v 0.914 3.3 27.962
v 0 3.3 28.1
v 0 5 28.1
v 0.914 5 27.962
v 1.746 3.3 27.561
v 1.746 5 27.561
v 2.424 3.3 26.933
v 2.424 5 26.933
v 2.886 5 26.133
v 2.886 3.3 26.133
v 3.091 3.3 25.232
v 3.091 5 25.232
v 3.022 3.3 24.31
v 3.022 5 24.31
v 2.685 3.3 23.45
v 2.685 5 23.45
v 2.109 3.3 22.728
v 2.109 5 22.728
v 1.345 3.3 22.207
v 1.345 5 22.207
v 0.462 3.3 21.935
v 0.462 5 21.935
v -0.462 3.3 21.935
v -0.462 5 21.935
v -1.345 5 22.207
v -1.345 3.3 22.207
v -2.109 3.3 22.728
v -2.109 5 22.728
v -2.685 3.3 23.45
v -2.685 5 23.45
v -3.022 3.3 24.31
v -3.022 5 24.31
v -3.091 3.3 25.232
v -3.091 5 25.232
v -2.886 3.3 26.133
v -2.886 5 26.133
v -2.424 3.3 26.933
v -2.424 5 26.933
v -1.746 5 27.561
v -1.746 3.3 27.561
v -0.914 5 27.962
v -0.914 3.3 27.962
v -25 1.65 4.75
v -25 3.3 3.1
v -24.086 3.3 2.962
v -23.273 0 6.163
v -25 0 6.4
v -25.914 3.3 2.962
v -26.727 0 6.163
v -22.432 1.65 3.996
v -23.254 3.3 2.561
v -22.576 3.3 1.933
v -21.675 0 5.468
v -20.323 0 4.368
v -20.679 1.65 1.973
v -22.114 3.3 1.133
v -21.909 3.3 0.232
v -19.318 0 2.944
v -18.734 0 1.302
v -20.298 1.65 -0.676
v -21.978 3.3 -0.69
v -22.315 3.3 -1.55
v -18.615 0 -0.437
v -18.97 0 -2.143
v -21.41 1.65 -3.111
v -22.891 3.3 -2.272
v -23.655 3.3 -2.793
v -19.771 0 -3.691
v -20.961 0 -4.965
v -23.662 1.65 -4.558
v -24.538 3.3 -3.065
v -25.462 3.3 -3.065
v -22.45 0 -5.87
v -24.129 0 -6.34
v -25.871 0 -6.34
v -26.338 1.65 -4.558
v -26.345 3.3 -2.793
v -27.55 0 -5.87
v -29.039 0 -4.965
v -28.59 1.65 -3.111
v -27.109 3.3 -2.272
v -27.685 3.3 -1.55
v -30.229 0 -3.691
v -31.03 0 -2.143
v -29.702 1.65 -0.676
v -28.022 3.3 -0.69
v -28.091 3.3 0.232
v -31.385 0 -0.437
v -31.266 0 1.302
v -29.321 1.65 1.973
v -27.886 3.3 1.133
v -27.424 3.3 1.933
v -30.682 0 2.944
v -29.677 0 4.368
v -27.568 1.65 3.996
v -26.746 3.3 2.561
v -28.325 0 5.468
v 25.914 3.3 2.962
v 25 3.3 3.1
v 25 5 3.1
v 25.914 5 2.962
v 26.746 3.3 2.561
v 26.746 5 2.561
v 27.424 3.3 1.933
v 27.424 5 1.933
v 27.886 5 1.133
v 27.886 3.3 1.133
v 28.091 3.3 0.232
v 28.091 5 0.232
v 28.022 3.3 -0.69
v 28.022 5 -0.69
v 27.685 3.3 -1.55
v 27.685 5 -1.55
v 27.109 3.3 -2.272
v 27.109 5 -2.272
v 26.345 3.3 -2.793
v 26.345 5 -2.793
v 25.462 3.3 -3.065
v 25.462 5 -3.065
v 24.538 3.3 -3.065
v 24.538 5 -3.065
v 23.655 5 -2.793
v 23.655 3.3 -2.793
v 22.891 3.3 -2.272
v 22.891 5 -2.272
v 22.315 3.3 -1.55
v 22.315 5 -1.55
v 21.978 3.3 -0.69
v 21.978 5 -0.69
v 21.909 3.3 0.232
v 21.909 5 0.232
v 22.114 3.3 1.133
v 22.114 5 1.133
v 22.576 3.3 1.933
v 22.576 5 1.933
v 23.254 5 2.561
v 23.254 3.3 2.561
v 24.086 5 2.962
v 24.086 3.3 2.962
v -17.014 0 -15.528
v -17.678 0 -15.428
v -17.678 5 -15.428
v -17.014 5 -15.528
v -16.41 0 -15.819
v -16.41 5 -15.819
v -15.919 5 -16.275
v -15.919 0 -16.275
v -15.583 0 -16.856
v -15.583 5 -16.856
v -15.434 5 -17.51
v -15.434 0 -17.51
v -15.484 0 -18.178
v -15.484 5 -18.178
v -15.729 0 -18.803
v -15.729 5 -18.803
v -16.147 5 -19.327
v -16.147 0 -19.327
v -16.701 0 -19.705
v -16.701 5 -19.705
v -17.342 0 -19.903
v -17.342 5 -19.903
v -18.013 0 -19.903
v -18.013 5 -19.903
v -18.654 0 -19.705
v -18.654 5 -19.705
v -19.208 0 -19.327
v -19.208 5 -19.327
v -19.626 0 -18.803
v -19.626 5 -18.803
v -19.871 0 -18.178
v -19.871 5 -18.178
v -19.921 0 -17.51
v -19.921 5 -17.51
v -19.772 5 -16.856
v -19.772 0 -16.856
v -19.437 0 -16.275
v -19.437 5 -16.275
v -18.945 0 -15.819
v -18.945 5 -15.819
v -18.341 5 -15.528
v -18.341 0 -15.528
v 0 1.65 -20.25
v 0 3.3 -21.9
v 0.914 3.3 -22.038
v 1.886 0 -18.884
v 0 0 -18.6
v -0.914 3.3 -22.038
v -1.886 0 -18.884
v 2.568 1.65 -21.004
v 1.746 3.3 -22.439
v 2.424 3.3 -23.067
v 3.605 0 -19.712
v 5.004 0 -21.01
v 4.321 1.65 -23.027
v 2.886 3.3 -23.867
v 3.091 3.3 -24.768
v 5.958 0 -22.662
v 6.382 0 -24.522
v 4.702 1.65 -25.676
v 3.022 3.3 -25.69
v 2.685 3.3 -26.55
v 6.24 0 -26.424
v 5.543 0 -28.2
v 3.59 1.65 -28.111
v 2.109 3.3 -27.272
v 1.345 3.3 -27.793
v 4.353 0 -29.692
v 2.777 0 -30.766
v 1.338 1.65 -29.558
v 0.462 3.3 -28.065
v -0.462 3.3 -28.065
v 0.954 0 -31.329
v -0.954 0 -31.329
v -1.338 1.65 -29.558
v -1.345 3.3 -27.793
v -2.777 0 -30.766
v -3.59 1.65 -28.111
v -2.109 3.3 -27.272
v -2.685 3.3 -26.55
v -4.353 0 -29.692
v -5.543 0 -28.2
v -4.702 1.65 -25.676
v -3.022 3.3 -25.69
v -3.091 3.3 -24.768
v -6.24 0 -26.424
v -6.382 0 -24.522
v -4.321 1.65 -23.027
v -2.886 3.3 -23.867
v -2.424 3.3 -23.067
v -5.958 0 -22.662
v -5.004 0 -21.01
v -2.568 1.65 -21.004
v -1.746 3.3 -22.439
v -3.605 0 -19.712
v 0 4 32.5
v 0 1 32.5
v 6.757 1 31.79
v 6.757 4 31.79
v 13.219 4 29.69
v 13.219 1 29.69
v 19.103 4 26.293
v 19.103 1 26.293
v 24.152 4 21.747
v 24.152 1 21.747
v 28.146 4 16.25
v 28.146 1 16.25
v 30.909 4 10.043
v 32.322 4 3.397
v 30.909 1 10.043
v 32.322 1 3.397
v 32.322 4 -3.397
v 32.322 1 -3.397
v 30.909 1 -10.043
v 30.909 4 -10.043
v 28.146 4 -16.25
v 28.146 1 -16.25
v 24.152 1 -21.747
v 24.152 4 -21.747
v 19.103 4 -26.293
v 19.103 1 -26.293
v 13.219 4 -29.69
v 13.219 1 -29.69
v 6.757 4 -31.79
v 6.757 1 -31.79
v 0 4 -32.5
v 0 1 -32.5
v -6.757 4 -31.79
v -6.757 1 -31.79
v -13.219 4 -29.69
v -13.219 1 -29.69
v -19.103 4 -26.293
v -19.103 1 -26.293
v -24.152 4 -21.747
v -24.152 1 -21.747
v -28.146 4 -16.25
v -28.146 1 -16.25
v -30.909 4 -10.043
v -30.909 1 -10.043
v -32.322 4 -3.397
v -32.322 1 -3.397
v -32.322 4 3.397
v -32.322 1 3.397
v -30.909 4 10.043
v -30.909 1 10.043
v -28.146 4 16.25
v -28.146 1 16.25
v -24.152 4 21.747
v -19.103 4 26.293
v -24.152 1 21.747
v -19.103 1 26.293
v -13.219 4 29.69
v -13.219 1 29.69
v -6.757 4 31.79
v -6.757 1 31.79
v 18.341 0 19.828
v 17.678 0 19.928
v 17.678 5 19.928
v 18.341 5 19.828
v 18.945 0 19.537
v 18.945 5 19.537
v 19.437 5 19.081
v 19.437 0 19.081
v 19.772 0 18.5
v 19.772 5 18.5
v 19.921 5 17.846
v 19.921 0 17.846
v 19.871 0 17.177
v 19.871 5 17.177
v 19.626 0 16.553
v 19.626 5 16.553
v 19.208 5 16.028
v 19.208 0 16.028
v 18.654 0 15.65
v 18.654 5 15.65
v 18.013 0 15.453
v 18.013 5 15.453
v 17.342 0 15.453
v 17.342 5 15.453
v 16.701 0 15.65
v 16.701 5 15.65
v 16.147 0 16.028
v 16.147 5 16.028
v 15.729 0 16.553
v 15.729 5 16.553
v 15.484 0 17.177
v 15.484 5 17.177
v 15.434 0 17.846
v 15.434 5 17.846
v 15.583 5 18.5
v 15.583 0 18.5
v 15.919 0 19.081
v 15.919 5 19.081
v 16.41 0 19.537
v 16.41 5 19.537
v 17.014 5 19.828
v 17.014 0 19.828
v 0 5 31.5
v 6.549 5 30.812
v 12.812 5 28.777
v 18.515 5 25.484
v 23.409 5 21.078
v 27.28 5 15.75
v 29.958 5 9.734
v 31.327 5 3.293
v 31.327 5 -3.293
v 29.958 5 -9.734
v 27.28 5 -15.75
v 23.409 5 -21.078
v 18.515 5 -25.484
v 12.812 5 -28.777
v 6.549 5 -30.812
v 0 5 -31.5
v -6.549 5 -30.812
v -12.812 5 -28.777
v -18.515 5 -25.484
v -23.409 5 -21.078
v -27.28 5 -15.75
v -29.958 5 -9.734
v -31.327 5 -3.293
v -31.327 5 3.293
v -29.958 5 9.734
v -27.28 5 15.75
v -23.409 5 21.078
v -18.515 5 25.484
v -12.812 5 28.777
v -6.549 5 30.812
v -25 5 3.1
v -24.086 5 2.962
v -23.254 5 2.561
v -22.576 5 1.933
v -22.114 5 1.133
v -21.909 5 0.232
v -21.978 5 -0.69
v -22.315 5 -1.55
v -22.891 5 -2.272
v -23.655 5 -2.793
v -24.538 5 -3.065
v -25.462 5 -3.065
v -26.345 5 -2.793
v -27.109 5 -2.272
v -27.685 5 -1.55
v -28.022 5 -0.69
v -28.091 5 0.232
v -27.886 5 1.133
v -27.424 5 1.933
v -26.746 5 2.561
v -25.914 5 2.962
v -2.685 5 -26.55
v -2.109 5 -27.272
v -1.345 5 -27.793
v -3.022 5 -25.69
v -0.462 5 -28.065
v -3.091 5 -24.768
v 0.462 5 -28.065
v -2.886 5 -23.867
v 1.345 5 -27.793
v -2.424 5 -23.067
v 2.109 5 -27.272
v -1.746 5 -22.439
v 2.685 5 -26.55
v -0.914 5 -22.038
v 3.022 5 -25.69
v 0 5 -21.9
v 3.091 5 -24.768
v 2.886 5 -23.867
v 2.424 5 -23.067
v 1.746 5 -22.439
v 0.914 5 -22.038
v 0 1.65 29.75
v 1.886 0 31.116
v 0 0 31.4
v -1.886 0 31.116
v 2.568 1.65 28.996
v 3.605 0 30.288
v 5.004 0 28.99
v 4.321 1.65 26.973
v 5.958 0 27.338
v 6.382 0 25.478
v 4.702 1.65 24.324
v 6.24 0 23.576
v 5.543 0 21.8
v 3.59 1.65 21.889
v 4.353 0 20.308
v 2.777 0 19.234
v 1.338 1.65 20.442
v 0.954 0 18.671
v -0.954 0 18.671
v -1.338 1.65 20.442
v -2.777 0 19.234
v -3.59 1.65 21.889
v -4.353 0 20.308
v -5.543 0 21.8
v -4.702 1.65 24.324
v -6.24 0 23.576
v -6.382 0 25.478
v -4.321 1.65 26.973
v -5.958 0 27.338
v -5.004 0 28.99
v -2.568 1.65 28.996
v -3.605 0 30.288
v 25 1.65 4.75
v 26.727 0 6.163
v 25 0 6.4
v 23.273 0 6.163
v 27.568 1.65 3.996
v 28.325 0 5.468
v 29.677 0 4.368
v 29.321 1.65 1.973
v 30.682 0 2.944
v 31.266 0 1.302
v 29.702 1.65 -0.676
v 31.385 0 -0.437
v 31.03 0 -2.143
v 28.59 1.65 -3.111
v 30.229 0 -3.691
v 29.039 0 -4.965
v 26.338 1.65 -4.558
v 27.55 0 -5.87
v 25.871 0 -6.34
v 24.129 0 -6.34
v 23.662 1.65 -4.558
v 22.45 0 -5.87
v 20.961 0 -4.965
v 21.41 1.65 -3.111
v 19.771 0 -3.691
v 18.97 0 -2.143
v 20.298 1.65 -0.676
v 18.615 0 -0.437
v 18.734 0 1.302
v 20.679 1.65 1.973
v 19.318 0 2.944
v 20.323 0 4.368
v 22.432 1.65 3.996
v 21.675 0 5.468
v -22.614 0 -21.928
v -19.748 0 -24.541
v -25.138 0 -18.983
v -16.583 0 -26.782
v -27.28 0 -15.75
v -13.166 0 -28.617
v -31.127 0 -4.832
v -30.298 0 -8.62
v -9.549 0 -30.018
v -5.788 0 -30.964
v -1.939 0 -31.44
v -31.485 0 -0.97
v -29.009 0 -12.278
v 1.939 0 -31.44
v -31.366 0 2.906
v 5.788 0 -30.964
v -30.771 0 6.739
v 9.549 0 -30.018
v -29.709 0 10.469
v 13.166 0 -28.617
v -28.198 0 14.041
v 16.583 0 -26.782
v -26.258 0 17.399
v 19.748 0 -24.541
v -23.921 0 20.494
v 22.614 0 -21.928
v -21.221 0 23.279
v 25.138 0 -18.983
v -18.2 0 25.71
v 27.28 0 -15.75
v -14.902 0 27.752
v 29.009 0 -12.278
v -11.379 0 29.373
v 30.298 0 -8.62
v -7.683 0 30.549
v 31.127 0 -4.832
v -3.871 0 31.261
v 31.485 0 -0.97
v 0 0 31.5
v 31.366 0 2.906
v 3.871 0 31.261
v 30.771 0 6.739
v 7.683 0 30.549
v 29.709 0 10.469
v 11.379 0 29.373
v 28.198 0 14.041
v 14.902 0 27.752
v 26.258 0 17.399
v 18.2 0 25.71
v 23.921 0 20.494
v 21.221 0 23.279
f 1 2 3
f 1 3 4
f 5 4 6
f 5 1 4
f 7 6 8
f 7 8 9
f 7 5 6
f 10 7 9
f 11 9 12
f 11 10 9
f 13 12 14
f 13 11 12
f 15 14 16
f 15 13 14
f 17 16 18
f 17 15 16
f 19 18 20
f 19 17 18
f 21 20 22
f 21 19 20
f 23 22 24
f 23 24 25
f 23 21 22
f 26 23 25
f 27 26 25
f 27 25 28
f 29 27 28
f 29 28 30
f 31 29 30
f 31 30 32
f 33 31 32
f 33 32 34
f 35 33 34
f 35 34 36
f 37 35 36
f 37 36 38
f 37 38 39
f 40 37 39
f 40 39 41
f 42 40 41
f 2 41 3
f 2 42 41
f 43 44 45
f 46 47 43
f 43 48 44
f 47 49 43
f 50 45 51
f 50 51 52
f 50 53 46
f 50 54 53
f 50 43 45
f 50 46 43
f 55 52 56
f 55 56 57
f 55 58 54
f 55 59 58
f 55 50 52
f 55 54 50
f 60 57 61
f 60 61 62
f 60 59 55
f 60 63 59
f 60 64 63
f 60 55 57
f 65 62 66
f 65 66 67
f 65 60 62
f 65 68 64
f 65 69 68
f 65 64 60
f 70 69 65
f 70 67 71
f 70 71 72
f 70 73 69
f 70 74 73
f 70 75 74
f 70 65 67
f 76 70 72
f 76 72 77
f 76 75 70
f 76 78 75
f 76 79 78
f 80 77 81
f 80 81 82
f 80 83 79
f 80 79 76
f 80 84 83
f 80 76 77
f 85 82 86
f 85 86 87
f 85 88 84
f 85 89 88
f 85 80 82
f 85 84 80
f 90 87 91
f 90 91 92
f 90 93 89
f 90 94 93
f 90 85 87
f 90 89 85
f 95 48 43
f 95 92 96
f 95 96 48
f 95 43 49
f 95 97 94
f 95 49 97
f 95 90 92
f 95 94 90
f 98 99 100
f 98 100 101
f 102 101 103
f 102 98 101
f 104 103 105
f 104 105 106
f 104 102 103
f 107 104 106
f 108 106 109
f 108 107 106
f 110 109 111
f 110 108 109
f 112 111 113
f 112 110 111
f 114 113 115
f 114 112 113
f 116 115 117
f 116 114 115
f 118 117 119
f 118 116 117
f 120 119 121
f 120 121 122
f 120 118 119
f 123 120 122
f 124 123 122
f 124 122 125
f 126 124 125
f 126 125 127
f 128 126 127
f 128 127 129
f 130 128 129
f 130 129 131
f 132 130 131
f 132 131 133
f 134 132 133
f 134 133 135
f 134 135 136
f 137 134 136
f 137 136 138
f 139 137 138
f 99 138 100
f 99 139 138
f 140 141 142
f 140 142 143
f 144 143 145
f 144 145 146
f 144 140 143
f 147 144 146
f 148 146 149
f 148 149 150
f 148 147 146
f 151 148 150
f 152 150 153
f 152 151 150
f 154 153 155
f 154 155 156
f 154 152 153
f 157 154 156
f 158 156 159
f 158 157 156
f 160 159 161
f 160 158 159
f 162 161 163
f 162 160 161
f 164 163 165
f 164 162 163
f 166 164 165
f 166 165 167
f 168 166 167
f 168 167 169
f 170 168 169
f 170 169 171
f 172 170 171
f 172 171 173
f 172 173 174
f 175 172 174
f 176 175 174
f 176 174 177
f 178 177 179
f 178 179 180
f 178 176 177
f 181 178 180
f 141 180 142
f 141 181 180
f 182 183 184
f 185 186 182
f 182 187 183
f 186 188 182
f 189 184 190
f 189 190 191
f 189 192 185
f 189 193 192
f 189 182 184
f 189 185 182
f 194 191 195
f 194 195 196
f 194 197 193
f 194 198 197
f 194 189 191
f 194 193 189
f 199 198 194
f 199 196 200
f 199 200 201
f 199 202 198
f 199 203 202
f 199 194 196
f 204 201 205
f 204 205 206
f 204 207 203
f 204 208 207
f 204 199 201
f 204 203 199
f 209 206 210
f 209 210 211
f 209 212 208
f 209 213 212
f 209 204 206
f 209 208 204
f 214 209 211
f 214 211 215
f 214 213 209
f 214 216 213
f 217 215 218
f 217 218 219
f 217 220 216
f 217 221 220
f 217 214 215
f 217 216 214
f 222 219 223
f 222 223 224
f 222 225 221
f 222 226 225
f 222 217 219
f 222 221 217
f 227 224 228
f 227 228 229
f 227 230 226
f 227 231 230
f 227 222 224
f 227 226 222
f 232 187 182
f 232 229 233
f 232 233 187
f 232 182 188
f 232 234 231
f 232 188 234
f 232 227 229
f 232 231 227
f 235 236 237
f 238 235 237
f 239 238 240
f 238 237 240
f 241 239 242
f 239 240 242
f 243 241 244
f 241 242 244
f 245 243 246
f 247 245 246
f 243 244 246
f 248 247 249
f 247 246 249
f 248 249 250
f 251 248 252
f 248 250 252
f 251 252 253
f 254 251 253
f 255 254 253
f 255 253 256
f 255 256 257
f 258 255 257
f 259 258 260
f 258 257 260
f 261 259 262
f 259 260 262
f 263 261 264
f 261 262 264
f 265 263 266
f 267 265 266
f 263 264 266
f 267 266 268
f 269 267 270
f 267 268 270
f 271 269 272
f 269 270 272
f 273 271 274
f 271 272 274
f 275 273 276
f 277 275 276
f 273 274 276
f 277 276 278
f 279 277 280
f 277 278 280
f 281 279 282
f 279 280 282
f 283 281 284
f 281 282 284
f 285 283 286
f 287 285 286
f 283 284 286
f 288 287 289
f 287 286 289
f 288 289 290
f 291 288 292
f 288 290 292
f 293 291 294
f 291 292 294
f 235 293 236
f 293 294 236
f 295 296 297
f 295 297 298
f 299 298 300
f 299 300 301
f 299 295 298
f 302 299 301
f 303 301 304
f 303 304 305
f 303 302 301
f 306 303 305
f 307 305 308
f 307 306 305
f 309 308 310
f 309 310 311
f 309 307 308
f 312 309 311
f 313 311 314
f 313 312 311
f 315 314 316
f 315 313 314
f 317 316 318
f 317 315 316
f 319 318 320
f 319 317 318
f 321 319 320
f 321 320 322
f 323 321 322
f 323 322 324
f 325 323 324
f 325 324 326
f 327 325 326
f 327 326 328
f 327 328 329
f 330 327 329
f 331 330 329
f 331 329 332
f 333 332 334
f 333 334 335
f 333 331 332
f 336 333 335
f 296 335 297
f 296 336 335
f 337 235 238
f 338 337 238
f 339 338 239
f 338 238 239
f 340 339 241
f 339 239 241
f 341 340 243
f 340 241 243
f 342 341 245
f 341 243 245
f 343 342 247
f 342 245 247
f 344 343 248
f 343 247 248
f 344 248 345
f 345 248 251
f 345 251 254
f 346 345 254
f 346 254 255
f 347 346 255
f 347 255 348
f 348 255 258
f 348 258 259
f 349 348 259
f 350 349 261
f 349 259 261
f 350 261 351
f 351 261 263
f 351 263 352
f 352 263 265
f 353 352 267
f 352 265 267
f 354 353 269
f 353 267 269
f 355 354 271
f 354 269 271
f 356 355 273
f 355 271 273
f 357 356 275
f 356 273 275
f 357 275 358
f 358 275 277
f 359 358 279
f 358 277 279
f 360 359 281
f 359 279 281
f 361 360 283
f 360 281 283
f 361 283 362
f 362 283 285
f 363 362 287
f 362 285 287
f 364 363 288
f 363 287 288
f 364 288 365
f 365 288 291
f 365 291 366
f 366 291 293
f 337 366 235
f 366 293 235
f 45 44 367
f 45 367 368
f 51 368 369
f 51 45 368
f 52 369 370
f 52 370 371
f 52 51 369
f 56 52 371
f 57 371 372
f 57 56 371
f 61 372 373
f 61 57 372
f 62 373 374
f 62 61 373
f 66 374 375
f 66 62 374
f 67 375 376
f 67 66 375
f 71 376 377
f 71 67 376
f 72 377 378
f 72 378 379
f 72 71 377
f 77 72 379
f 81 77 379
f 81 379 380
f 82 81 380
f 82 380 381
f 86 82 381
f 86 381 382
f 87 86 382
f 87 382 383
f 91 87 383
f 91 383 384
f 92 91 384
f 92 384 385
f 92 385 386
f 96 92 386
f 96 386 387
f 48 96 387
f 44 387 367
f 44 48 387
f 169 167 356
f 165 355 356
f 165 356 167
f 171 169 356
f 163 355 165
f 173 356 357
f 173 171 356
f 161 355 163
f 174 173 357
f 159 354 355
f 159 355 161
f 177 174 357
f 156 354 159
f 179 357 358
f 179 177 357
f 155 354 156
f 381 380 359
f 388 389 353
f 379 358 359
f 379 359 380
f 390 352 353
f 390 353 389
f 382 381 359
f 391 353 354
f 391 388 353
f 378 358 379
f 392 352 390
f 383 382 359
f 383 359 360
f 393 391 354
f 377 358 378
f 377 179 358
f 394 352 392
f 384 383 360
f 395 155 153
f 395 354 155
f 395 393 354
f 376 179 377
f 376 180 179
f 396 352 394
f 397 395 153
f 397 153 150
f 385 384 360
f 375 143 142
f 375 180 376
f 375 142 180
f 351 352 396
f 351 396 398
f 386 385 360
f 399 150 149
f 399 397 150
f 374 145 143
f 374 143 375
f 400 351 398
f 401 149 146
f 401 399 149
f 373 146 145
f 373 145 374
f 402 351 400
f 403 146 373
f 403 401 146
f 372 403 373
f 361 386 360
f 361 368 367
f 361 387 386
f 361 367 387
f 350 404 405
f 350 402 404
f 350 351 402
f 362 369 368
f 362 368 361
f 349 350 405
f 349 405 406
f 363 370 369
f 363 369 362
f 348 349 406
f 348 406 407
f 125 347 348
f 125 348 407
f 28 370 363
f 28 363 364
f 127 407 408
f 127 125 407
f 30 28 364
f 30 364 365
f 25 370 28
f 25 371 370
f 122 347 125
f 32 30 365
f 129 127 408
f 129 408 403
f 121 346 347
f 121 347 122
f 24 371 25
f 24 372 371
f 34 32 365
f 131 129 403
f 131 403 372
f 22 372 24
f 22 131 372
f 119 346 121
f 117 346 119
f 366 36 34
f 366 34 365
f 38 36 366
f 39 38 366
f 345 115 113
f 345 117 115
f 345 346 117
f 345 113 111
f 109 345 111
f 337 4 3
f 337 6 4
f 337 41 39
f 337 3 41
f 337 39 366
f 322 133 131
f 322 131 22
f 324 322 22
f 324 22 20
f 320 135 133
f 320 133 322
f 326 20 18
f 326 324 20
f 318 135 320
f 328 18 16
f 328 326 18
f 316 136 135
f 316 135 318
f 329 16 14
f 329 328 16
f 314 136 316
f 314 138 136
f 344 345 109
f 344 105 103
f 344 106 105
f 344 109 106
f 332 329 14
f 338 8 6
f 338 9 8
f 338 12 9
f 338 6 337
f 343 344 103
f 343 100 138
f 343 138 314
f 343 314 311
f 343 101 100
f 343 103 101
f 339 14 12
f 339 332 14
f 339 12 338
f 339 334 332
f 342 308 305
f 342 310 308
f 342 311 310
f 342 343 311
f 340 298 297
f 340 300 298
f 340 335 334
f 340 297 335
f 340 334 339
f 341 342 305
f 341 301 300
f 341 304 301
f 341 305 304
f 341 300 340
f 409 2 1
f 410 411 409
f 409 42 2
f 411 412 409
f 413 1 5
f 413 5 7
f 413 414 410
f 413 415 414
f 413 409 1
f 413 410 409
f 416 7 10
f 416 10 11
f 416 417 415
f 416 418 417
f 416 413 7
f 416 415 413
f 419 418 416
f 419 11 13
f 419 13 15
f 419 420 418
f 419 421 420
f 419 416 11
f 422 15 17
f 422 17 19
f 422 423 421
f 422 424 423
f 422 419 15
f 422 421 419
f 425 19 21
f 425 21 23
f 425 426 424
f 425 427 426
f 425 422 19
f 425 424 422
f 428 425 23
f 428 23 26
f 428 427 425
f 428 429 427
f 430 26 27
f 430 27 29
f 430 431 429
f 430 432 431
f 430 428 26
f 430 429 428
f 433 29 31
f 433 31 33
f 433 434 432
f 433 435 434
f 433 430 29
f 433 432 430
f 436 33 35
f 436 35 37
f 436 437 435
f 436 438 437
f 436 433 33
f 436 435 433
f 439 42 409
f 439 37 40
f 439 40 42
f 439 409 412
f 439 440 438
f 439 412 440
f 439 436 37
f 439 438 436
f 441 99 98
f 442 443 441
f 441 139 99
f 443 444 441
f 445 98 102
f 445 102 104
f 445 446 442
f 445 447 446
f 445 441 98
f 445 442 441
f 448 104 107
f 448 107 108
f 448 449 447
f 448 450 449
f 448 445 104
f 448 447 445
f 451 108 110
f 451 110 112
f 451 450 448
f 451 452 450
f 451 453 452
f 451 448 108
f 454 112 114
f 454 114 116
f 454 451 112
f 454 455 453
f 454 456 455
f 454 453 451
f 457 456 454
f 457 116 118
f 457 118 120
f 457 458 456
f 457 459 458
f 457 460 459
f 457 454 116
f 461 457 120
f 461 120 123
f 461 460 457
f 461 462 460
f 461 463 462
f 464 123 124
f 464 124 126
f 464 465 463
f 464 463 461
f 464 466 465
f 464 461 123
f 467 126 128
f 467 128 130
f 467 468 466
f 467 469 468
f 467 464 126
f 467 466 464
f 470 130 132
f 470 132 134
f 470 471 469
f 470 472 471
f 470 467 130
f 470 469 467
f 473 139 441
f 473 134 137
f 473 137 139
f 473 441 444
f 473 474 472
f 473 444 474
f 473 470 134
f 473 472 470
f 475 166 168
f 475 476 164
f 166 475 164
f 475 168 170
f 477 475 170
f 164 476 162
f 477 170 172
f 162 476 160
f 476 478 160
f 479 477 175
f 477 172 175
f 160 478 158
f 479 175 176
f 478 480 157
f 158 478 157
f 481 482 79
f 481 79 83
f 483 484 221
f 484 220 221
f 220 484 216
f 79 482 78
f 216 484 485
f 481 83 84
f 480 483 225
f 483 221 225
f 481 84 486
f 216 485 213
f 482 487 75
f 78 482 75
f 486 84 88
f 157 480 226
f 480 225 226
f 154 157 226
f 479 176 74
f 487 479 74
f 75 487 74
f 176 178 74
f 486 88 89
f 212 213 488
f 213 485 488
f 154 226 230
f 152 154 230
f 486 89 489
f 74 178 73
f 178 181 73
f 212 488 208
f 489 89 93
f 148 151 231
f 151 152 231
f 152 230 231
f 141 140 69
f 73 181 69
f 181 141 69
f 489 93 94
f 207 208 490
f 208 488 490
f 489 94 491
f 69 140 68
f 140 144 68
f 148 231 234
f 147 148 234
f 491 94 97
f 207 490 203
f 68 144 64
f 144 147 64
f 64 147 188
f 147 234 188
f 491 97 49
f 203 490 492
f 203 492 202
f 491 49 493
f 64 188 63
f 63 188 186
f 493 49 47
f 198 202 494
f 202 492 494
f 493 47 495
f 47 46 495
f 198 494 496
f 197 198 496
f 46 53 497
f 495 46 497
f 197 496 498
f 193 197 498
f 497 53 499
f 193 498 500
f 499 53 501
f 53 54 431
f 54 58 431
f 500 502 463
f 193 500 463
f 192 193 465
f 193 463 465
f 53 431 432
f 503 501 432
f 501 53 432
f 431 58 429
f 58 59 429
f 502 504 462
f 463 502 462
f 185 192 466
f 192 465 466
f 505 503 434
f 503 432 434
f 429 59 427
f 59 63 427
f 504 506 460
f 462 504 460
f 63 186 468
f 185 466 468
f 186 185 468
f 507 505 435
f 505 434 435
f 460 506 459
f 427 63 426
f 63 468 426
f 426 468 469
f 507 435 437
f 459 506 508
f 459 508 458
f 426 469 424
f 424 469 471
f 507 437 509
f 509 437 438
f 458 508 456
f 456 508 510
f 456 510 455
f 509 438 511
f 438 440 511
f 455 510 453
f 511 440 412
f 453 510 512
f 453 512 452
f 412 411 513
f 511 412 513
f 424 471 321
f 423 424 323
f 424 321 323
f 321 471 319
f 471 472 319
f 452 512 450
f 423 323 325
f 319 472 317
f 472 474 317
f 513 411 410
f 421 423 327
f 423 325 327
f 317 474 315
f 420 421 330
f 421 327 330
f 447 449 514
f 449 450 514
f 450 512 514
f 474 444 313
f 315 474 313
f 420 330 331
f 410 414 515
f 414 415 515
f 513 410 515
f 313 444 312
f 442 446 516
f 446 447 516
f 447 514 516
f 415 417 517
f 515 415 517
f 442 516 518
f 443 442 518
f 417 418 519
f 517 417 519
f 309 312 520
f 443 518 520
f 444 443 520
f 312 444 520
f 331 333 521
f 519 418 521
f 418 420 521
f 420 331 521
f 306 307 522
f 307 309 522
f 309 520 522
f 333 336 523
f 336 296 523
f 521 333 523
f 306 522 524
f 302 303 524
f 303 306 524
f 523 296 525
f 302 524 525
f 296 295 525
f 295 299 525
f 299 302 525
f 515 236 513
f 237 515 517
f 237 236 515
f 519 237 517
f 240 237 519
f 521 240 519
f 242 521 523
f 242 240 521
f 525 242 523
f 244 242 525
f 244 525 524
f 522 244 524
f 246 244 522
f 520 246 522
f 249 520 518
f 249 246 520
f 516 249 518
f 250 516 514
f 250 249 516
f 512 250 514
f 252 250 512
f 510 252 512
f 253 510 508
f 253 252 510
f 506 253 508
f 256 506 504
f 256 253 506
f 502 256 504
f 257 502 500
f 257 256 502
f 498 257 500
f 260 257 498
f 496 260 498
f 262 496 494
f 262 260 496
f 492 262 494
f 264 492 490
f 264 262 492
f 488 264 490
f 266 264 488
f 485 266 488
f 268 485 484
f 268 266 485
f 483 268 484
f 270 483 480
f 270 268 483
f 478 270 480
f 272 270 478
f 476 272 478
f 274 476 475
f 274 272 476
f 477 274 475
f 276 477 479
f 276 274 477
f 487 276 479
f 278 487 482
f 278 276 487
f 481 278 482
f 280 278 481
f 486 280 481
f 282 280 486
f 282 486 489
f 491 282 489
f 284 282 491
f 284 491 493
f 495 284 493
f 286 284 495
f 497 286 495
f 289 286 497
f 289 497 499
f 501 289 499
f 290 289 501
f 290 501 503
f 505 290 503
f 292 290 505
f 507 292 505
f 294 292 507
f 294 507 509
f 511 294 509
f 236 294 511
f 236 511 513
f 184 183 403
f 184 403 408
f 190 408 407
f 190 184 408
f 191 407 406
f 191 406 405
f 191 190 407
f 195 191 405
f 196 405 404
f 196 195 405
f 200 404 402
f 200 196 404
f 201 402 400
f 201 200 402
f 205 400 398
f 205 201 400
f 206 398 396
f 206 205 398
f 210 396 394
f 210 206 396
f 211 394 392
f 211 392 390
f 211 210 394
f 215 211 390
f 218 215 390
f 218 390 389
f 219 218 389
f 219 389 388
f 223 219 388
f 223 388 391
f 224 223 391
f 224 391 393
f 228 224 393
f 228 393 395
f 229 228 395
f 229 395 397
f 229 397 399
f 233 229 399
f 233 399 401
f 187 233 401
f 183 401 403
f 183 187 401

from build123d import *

# Parameters (mm, degrees)
SKETCH1_R           = 32.5
SKETCH1_R_2         = 3.1
SKETCH1_R_3         = 2.25
BOSS_EXTRUDE1_DEPTH = 5
CHAMFER1_SIZE       = 3.3
CHAMFER2_SIZE       = 1


with BuildPart() as part:
    # Sketch1 → Boss-Extrude1 (new body)
    with BuildSketch(Plane(origin=(0, 0, 0), x_dir=(1, 0, 0), z_dir=(0, 1, 0))):
        Circle(SKETCH1_R)
        with Locations((0, 25)):
            Circle(SKETCH1_R_2, mode=Mode.SUBTRACT)
        with Locations((25, 0)):
            Circle(SKETCH1_R_2, mode=Mode.SUBTRACT)
        with Locations((0, -25)):
            Circle(SKETCH1_R_2, mode=Mode.SUBTRACT)
        with Locations((-25, 0)):
            Circle(SKETCH1_R_2, mode=Mode.SUBTRACT)
        with Locations((-17.67766953, 17.67766953)):
            Circle(SKETCH1_R_3, mode=Mode.SUBTRACT)
        with Locations((17.67766953, -17.67766953)):
            Circle(SKETCH1_R_3, mode=Mode.SUBTRACT)
    extrude(amount=BOSS_EXTRUDE1_DEPTH)

    # Chamfer1
    chamfer1_edges = [part.edges().sort_by_distance(p)[0] for p in [
        (-3.1, 0, -25),
        (21.9, 0, 0),
        (-3.1, 0, 25),
        (-28.1, 0, 0),
    ]]
    chamfer(chamfer1_edges, length=CHAMFER1_SIZE)

    # Chamfer2
    chamfer2_edges = [part.edges().sort_by_distance(p)[0] for p in [
        (-32.5, 5, 0),
        (-32.5, 0, 0),
    ]]
    chamfer(chamfer2_edges, length=CHAMFER2_SIZE)


solid = part.part
